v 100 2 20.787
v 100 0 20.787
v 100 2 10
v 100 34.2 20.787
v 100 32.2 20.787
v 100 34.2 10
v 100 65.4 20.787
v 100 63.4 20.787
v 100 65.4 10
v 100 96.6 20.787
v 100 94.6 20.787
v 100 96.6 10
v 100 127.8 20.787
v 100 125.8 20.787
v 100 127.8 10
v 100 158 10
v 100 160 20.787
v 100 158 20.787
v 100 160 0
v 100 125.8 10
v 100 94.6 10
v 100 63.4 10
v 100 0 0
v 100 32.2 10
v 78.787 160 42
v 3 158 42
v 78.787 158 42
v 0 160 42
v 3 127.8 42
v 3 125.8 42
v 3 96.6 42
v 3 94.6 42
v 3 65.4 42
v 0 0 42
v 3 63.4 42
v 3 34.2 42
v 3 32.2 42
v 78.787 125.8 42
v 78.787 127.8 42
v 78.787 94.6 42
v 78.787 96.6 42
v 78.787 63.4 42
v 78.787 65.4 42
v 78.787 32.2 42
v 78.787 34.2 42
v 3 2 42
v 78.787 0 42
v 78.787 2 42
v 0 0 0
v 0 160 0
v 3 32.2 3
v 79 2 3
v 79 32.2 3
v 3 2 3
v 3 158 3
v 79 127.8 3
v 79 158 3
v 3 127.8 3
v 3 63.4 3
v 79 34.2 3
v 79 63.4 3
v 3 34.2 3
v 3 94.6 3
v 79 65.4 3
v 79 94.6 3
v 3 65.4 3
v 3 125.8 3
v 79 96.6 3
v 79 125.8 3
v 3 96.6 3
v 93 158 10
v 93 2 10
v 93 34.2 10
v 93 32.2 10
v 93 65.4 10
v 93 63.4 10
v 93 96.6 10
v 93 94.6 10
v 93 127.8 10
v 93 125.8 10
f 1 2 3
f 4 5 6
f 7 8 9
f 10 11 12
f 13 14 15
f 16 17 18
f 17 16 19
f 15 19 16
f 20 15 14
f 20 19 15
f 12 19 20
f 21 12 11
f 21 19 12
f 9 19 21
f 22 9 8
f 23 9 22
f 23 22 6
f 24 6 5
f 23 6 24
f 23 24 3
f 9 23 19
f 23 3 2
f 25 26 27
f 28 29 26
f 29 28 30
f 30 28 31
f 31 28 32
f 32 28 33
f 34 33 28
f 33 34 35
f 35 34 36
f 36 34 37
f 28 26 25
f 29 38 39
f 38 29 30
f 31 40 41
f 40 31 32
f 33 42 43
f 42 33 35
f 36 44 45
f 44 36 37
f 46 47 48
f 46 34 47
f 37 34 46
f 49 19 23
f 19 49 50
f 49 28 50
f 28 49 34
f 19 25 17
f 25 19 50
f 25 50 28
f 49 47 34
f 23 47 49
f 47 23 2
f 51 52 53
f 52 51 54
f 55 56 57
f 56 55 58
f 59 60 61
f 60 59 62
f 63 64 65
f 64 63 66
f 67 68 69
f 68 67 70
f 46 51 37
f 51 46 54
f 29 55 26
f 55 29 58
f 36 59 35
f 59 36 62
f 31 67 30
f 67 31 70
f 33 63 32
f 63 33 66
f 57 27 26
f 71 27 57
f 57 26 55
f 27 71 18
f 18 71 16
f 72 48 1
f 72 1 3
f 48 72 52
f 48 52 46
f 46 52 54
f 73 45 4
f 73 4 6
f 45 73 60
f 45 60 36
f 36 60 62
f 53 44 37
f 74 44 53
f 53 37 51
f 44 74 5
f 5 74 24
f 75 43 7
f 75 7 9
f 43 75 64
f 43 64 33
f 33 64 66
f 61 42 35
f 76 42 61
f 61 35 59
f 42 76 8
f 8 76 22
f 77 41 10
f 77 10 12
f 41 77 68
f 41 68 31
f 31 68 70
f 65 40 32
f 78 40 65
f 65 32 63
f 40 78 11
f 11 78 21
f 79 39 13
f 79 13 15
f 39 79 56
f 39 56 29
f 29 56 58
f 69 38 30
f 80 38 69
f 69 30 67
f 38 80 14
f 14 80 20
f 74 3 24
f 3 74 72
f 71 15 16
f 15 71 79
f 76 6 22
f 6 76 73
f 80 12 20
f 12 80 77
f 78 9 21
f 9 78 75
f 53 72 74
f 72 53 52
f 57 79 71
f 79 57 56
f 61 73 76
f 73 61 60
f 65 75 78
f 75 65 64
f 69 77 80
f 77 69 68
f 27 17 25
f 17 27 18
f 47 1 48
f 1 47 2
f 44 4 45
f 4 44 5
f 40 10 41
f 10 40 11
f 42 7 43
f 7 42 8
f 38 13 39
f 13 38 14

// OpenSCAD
include <MCAD/boxes.scad>

//Pill box with sliding lid

/* [Outside Box Dimensions] */
//Box Width (min: 5 x Wall Thickness)
bX=100; 
//Box Depth (min: 5 x Wall Thickness)
bY=160; 
//Box Height (min: 5 x Wall Thickness)
bZ=42;

//X Dividers (0 for no dividers)
col=0; 
//Y Dividers (0 for no dividers)
row=5; 
//Divider Wall Thickness
divWall=2;

/* [Lip] */
//Lip height (0 = no lip)
lipHeight=7;
//Lip width (0 = no lip)
lipWidth=7;
//Prism with (0 = no prism)
prismWith=14; 

/* [Wall Thickness] */
//Wall Thickness (min: 2mm)
wall=2;



/* [Hidden] */
boxDim=[bX, bY, bZ]; 
over=0; //amount to extend parts that need to have interference (such as dividers)
sidesonly = 1;
chamfer=30;


module xDiv(inSide){
  xInc=inSide[0]/col;
  for ( i = [1 : col-1] ) {
    translate([i*xInc, 0, 0])cube([divWall, inSide[1]+over, inSide[2]+over], center=true);
  }
}

module prism(l, w, h) {
       polyhedron(points=[
               [0,0,h],           // 0    front top corner
               [0,0,0],[w,0,0],   // 1, 2 front left & right bottom corners
               [0,l,h],           // 3    back top corner
               [0,l,0],[w,l,0]    // 4, 5 back left & right bottom corners
       ], faces=[ // points for all faces must be ordered clockwise when looking in
               [0,2,1],    // top face
               [3,4,5],    // base face
               [0,1,4,3],  // h face
               [1,2,5,4],  // w face
               [0,3,5,2],  // hypotenuse face
       ]);
}


module yDiv(inSide){
  yInc=inSide[1]/row;
  echo("Tool width:",yInc);
  for (i = [1 : row-1] ) {
	translate([0, i*yInc, 0])cube([inSide[0]+wall, divWall, inSide[2]+wall], center=true);
  }
}

module drawBox () {
  innerBox=[bX-wall, bY-(2*wall), bZ-wall];
  echo("innerBox=", innerBox);
  difference(){
		union() {
			difference() {
			  roundedBox(boxDim, 0, 1, $fn=36);
			  translate([wall,0,wall])roundedBox(innerBox, 0, 1, $fn=20);
			}
			translate([-innerBox[0]/2, 0, -over/2]) xDiv(innerBox);
			translate([0, -innerBox[1]/2, 0]) yDiv(innerBox);
			
			//lip
			if (lipHeight && lipWidth){
				translate([boxDim[0]/2-lipWidth/2,0,-innerBox[2]/2+lipHeight/2+wall])cube([lipWidth, innerBox[1], lipHeight], center=true);
				if (prismWith){
					translate([boxDim[0]/2-lipWidth,-innerBox[1]/2,-innerBox[2]/2+wall])rotate([0,-90,0])prism(innerBox[1], lipHeight,prismWith);
				}
			}
			
			
		}
		translate([boxDim[0]/2,0,boxDim[2]/2])rotate([0,-45,0])cube([chamfer, boxDim[1], chamfer+10], center=true);	
	}
}

module assemble() {
    translate([boxDim[0]/2,boxDim[1]/2,boxDim[2]/2])drawBox();
}

assemble();
